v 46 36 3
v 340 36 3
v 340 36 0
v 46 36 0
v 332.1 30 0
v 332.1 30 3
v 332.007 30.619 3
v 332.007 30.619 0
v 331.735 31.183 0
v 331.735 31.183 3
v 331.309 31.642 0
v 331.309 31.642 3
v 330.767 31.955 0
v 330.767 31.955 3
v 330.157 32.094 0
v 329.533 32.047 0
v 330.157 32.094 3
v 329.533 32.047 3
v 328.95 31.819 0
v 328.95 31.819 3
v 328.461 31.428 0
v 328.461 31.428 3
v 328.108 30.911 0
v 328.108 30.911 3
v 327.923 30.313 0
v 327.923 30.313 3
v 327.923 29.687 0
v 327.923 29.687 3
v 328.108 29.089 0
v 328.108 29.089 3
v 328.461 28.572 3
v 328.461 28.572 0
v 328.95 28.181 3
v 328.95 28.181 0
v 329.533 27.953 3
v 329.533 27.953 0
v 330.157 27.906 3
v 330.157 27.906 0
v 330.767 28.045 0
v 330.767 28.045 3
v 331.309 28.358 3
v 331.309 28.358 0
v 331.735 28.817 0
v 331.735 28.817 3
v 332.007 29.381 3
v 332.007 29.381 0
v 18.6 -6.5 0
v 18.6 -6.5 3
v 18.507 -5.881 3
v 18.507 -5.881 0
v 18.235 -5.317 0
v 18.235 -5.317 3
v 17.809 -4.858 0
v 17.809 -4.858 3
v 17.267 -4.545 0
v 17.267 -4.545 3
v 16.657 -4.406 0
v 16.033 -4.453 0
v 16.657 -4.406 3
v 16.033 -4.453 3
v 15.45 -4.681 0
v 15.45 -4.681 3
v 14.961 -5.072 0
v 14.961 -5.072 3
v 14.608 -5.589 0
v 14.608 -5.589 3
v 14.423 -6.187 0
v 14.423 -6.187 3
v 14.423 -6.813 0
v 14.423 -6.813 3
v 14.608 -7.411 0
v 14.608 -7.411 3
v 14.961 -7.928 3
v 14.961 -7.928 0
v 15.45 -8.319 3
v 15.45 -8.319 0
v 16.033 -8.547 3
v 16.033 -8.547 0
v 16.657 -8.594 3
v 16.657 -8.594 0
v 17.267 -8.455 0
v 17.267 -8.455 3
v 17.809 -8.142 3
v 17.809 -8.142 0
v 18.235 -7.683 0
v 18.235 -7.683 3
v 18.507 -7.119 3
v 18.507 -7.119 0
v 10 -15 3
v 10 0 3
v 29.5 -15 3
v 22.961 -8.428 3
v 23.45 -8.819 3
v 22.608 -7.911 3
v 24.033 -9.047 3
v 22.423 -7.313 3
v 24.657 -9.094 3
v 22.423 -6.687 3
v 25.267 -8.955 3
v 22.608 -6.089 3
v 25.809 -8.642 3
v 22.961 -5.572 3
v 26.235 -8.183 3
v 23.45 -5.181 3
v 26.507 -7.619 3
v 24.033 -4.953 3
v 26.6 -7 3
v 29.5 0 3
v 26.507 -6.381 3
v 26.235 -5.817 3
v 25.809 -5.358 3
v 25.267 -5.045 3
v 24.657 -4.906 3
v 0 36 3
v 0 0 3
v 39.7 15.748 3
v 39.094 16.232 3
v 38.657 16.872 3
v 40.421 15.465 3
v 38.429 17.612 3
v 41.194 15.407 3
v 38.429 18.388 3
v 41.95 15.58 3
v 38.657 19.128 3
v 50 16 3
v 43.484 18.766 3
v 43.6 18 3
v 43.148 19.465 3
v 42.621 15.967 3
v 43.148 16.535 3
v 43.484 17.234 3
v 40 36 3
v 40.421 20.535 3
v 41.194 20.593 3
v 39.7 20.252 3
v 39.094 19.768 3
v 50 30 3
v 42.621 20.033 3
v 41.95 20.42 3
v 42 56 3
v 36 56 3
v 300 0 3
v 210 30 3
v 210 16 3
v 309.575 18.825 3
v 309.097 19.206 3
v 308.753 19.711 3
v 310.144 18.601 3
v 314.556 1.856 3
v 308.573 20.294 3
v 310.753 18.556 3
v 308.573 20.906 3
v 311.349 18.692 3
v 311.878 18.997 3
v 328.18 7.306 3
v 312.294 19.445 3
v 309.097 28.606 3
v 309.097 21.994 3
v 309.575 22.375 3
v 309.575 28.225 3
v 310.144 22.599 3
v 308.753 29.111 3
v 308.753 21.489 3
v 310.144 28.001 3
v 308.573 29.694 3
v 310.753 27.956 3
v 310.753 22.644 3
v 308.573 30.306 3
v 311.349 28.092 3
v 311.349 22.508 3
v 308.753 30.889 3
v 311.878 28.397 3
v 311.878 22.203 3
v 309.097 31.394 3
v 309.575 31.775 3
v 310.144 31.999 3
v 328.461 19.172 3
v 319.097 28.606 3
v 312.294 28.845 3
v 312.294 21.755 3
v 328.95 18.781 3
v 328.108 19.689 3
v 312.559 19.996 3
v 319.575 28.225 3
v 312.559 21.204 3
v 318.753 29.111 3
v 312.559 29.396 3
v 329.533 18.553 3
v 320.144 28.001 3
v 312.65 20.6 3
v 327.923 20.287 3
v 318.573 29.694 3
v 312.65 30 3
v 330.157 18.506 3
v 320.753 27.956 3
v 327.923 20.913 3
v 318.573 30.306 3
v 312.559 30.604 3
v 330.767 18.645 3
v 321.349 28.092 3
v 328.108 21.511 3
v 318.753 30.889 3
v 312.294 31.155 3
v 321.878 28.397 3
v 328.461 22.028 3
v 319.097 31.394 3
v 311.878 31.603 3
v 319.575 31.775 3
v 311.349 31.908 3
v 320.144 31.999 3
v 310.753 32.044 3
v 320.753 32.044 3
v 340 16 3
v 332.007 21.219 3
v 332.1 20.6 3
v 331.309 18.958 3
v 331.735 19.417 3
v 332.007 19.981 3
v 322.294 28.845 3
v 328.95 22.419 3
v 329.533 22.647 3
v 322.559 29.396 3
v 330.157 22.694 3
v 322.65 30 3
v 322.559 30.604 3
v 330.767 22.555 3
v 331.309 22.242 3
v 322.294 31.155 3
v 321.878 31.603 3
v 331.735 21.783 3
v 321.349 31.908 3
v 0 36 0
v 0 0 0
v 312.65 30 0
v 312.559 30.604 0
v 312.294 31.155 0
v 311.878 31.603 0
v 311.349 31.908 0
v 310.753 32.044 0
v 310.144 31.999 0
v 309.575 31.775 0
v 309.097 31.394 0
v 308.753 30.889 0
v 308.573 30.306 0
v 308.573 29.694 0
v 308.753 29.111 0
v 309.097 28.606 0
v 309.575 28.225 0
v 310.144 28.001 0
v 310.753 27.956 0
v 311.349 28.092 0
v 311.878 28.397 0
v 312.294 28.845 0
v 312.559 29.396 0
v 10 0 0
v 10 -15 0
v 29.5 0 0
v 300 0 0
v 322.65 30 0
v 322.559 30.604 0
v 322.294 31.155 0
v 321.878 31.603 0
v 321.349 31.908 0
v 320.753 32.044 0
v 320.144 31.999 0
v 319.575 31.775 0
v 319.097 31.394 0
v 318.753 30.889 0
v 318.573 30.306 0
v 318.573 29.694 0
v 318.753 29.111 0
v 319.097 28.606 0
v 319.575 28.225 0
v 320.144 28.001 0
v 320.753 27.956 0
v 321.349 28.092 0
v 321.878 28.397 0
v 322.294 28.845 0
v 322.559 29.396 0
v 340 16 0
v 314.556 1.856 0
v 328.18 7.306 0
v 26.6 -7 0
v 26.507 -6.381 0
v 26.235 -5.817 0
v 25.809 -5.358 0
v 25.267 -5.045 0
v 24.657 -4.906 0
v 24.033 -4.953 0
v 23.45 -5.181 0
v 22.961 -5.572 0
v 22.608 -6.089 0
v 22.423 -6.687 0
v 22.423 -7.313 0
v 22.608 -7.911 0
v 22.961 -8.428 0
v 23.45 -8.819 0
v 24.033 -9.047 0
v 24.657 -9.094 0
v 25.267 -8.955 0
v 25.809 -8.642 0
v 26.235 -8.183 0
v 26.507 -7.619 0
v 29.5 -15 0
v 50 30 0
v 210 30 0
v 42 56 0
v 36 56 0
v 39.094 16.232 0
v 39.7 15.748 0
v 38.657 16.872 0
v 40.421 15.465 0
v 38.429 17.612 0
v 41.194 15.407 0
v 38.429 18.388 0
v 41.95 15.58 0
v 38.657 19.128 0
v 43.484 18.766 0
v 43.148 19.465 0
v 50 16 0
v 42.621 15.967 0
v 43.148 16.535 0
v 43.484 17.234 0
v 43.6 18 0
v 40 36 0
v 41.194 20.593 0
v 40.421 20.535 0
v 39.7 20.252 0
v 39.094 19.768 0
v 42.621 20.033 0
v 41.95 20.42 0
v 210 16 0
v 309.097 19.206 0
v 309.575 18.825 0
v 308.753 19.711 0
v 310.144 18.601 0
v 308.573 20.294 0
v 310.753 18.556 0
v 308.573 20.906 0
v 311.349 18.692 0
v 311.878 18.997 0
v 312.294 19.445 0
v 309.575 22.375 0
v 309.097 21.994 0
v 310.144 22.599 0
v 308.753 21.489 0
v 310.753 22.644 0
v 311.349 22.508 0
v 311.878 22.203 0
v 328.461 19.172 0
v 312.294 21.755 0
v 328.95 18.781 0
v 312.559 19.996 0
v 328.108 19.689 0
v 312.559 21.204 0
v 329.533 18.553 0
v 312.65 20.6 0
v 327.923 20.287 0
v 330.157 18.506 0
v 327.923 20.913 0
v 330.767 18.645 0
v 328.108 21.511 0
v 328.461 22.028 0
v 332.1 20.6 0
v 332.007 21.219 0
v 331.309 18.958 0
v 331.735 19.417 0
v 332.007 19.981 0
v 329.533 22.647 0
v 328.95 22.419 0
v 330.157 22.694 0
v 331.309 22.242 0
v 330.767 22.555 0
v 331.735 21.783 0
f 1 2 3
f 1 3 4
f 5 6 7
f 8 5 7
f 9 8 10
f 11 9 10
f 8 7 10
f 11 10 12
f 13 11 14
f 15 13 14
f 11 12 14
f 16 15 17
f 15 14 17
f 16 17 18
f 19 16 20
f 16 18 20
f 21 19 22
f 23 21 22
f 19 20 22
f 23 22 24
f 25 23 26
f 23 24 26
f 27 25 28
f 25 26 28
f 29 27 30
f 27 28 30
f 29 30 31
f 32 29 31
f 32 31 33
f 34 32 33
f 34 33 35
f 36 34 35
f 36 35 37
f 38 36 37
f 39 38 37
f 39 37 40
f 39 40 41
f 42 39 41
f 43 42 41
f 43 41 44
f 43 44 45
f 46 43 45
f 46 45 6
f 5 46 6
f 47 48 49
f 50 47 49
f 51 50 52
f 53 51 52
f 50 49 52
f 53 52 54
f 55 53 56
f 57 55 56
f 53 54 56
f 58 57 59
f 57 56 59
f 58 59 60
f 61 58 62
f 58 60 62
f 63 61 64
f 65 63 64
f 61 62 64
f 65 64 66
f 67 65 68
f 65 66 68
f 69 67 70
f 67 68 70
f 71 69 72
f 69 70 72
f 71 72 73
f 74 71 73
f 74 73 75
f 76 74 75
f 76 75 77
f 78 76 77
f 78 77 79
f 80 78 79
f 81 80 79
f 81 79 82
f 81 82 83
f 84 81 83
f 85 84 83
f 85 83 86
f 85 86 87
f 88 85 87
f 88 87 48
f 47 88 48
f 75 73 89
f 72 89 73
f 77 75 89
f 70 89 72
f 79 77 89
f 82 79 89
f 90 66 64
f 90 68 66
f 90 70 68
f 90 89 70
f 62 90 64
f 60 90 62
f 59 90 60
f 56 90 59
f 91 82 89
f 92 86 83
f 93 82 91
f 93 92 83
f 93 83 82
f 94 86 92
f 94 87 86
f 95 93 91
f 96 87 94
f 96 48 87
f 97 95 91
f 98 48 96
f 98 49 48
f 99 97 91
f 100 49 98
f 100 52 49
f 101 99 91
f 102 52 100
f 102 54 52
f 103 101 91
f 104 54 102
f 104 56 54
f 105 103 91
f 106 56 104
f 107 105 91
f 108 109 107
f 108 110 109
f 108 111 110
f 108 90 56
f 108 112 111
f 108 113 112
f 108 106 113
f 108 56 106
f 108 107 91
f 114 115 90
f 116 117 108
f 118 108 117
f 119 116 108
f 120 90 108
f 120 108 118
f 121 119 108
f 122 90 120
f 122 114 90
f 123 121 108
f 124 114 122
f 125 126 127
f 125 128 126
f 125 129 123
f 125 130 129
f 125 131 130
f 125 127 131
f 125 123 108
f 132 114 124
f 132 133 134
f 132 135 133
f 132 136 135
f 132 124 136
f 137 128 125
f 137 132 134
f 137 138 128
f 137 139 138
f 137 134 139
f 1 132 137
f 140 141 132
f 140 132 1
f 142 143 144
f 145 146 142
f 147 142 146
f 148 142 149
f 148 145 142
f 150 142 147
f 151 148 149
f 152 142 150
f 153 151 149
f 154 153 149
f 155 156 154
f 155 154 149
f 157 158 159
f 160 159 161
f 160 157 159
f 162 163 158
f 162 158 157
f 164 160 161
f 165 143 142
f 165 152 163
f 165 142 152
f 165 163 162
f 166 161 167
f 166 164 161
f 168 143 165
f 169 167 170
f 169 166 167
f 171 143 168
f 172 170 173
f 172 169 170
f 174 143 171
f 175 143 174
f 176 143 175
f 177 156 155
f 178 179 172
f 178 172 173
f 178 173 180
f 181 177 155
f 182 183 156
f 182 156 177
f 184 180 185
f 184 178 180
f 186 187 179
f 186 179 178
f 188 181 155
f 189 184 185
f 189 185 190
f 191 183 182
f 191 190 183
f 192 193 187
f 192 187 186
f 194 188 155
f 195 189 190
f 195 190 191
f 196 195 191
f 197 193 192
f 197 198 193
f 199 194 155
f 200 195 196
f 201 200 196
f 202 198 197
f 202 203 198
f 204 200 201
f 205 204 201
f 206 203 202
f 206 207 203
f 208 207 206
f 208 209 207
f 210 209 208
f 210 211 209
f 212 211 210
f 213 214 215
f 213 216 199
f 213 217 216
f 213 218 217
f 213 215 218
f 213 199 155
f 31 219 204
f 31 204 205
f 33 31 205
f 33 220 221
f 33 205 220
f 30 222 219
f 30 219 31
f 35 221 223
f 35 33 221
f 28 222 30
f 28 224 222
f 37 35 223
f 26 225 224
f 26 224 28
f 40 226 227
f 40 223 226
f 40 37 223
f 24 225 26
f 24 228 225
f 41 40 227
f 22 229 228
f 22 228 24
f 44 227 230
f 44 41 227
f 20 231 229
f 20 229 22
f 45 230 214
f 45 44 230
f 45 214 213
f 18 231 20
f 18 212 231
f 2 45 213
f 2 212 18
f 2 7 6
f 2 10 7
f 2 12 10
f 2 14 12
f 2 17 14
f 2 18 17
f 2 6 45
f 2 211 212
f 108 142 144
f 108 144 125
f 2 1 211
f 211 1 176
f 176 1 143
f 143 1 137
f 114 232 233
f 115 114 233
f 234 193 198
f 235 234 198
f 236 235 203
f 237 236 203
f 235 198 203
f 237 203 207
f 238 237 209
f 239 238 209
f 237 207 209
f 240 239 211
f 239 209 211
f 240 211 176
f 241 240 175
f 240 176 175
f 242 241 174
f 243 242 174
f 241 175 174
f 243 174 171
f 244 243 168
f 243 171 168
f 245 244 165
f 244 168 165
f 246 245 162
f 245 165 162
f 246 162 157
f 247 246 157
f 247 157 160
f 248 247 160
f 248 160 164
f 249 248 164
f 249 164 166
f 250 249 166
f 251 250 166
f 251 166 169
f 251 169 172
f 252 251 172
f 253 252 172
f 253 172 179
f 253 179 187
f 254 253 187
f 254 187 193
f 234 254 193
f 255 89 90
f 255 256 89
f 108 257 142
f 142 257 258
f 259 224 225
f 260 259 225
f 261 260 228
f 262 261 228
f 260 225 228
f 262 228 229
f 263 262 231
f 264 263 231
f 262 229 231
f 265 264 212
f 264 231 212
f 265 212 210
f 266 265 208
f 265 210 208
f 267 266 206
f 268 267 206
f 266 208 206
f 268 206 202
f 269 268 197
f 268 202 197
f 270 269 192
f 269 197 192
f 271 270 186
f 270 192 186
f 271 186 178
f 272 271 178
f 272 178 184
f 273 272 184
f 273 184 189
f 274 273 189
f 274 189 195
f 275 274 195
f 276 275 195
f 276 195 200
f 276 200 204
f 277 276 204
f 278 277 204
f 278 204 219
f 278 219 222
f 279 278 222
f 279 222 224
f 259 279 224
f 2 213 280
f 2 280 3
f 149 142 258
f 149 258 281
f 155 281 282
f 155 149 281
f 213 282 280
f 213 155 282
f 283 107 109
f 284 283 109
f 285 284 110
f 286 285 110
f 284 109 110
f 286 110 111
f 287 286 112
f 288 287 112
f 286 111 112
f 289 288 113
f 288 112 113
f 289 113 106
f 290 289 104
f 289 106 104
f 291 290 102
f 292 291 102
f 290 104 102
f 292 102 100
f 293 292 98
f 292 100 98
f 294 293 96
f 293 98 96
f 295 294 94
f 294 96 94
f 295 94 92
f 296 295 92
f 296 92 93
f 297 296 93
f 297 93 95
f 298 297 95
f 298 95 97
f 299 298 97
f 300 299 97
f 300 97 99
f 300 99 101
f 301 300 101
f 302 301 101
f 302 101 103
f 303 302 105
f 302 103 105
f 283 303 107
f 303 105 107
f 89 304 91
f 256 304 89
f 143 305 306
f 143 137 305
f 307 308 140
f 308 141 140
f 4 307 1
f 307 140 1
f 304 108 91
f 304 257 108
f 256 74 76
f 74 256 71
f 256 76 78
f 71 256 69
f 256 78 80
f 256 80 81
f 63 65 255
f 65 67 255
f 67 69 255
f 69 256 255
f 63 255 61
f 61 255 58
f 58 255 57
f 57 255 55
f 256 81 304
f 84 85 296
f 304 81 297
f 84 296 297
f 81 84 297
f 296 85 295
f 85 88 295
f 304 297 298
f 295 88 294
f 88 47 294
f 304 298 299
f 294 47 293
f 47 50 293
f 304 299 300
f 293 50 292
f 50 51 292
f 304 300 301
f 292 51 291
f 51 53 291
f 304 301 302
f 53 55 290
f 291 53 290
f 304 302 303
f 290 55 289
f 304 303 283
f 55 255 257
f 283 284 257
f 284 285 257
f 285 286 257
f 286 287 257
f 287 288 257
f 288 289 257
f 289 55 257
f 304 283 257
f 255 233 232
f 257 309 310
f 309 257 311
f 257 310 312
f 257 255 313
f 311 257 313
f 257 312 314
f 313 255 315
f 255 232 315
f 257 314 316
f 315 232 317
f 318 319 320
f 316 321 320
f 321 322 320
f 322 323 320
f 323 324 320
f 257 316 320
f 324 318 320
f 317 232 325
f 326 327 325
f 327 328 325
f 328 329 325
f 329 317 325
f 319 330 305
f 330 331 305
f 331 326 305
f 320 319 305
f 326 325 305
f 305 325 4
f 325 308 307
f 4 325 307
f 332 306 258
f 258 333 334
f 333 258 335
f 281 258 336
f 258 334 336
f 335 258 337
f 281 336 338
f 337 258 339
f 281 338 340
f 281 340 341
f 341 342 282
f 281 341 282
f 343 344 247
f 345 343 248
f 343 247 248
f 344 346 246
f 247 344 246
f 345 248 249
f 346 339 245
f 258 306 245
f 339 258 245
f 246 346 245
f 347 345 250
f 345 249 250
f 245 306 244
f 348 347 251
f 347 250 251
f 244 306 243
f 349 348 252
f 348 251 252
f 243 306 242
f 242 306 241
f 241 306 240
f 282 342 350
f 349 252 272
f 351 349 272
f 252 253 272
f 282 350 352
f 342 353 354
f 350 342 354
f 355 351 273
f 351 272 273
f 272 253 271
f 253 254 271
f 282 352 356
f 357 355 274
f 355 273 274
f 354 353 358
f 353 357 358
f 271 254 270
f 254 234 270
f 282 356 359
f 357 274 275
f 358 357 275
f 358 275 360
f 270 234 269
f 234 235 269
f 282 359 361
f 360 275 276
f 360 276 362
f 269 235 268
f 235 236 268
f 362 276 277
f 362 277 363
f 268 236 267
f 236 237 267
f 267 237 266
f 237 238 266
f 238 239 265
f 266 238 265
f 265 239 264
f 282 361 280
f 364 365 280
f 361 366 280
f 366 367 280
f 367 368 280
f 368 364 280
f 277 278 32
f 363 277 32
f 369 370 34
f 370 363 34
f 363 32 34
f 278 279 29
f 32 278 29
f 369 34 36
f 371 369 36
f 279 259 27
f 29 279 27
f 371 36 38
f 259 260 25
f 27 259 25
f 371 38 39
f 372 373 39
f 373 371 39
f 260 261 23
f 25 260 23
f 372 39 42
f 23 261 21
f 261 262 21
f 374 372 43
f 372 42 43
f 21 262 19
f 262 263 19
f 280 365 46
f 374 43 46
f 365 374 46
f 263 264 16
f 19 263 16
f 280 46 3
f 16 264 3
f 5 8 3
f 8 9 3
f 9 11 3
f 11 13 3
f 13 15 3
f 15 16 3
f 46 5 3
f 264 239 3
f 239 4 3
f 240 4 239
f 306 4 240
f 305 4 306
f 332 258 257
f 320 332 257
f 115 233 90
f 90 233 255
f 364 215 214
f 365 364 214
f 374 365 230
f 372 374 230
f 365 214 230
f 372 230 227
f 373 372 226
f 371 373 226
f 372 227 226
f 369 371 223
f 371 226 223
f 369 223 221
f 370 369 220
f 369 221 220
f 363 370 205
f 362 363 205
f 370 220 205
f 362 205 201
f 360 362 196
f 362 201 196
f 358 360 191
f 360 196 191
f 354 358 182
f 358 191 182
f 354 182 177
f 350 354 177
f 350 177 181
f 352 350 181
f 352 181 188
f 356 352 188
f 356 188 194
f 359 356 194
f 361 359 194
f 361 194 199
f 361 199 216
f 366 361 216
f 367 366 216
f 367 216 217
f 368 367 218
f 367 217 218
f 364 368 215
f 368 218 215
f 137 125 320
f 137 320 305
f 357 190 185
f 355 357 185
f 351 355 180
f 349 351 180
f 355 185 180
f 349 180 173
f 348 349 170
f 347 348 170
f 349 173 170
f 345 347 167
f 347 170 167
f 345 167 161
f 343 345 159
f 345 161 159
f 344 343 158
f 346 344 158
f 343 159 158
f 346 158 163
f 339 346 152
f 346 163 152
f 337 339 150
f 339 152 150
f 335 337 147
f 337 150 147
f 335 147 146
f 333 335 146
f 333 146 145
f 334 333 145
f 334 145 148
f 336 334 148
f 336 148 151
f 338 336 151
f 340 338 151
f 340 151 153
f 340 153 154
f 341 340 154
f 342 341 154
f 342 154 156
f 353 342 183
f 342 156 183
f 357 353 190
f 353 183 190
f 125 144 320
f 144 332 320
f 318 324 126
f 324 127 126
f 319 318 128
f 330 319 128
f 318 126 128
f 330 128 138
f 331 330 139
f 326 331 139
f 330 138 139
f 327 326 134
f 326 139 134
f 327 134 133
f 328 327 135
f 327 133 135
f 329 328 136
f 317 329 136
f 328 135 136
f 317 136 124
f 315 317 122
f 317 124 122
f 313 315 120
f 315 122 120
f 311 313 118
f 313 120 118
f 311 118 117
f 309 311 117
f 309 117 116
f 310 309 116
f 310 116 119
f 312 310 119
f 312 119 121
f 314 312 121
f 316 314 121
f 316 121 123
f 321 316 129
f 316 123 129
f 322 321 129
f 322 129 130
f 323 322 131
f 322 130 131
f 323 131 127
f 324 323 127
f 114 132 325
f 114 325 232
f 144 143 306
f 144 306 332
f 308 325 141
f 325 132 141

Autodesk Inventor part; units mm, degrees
ref_plane "YZ Plane" through (0, 0, 0) normal (1, 0, 0) x (0, 1, 0)
ref_plane "XZ Plane" through (0, 0, 0) normal (0, 1, 0) x (-1, 0, 0)
ref_plane "XY Plane" through (0, 0, 0) normal (0, 0, 1) x (1, 0, 0)
sketch "Sketch1" plane through (0, 0, 0) normal (0, 0, 1) x (1, 0, 0)
  line L0 (0, 0) -> (300, 0)
  line L1 (300, 0) -> (300, 16)
  line L2 (300, 16) -> (0, 16)
  line L3 (0, 16) -> (0, 0)
  line L4 (0, 0) -> (22.0483, 0)
  line L5 (10, 0) -> (29.5, 0)
  line L6 (29.5, 0) -> (29.5, -15)
  line L7 (29.5, -15) -> (10, -15)
  line L8 (10, -15) -> (10, 0)
  point P0 (0, 8)
  dimension "d2" = 19.5
  dimension "d3" = 15
  dimension "d4" = 10
  dimension "d5" = 16
  dimension "d8" = 300
extrude "Extrusion1" add sketch "Sketch1" along normal blind 3
sketch "Sketch2" plane through (0, 0, 3) normal (0, 0, 1) x (1, 0, 0)
  line L0 (0, 16) -> (0, 0) projected
  line L1 (0, 16) -> (0, 36)
  line L2 (300, 0) -> (300, 16) projected
  line L3 (340, 16) -> (340, 36)
  line L4 (340, 36) -> (0, 36)
  line L5 (300, 16) -> (0, 16) projected
  line L6 (50, 16) -> (50, 30)
  line L7 (50, 30) -> (210, 30)
  line L8 (210, 30) -> (210, 16)
  line L9 (40, 36) -> (36, 56)
  line L10 (36, 56) -> (42, 56)
  line L11 (42, 56) -> (46, 36)
  circle A0 centre (330, 30) radius 2.1
  circle A1 centre (330, 20.6) radius 2.1
  circle A2 centre (320.6, 30) radius 2.05
  line L12 (340, 16) -> (300, 16)
  circle A3 centre (310.6, 30) radius 2.05
  circle A4 centre (310.6, 20.6) radius 2.05
  dimension "d44" = 20
  dimension "d45" = 160
  dimension "d46" = 50
  dimension "d47" = 14
  dimension "d48" = 20
  dimension "d49" = 6
  dimension "d50" = 4
  dimension "d51" = 40
  dimension "d83" = 4.2
  dimension "d84" = 4.2
  dimension "d85" = 6
  dimension "d86" = 9.4
  dimension "d87" = 10
  dimension "d97" = 4.1
  dimension "d98" = 9.4
  dimension "d99" = 40
  dimension "d103" = 4.1
  dimension "d104" = 4.1
  dimension "d105" = 10
extrude "Extrusion2" add sketch "Sketch2" against normal blind 3 contours L1 L4 L3 L12 L5 L8 L7 L6 | L9 L10 L11 L4
sketch "Sketch3" plane through (0, 0, 3) normal (0, 0, 1) x (1, 0, 0)
  circle A0 centre (16.5, -6.5) radius 2.1
  circle A1 centre (24.5, -7) radius 2.1
  line L0 (29.5, 0) -> (300, 0) projected
  line L1 (29.5, -15) -> (29.5, 0) projected
  point P0 (0, 0)
  dimension "d75" = 4.2
  dimension "d76" = 6.5
  dimension "d77" = 4.2
  dimension "d78" = 7
  dimension "d79" = 5
  dimension "d80" = 8
extrude "Extrusion3" cut sketch "Sketch3" against normal blind 3
sketch "Sketch4" plane through (0, 0, 3) normal (0, 0, 1) x (1, 0, 0)
  line L0 (29.5, 0) -> (300, 0) projected
  circle A0 centre (41, 18) radius 2.6
  line L1 (340, 36) -> (46, 36) projected
  point P0 (0, 0)
  dimension "d95" = 18
  dimension "d96" = 5.2
  dimension "d100" = 5
extrude "Extrusion4" cut sketch "Sketch4" against normal blind 3
sketch "Sketch5" plane through (0, 0, 3) normal (0, 0, 1) x (1, 0, 0)
  line L0 (29.5, 0) -> (300, 0) projected
  arc A0 (300, 0) -> (340, 16) centre (300, 58) ccw
  line L1 (300, 0) -> (300, 16) projected
  line L2 (300, 0) -> (300, 16)
  line L3 (300, 16) -> (340, 16)
  point P0 (0, 0)
extrude "Extrusion5" add sketch "Sketch5" against normal blind 3
properties part number "Middle_bar"
